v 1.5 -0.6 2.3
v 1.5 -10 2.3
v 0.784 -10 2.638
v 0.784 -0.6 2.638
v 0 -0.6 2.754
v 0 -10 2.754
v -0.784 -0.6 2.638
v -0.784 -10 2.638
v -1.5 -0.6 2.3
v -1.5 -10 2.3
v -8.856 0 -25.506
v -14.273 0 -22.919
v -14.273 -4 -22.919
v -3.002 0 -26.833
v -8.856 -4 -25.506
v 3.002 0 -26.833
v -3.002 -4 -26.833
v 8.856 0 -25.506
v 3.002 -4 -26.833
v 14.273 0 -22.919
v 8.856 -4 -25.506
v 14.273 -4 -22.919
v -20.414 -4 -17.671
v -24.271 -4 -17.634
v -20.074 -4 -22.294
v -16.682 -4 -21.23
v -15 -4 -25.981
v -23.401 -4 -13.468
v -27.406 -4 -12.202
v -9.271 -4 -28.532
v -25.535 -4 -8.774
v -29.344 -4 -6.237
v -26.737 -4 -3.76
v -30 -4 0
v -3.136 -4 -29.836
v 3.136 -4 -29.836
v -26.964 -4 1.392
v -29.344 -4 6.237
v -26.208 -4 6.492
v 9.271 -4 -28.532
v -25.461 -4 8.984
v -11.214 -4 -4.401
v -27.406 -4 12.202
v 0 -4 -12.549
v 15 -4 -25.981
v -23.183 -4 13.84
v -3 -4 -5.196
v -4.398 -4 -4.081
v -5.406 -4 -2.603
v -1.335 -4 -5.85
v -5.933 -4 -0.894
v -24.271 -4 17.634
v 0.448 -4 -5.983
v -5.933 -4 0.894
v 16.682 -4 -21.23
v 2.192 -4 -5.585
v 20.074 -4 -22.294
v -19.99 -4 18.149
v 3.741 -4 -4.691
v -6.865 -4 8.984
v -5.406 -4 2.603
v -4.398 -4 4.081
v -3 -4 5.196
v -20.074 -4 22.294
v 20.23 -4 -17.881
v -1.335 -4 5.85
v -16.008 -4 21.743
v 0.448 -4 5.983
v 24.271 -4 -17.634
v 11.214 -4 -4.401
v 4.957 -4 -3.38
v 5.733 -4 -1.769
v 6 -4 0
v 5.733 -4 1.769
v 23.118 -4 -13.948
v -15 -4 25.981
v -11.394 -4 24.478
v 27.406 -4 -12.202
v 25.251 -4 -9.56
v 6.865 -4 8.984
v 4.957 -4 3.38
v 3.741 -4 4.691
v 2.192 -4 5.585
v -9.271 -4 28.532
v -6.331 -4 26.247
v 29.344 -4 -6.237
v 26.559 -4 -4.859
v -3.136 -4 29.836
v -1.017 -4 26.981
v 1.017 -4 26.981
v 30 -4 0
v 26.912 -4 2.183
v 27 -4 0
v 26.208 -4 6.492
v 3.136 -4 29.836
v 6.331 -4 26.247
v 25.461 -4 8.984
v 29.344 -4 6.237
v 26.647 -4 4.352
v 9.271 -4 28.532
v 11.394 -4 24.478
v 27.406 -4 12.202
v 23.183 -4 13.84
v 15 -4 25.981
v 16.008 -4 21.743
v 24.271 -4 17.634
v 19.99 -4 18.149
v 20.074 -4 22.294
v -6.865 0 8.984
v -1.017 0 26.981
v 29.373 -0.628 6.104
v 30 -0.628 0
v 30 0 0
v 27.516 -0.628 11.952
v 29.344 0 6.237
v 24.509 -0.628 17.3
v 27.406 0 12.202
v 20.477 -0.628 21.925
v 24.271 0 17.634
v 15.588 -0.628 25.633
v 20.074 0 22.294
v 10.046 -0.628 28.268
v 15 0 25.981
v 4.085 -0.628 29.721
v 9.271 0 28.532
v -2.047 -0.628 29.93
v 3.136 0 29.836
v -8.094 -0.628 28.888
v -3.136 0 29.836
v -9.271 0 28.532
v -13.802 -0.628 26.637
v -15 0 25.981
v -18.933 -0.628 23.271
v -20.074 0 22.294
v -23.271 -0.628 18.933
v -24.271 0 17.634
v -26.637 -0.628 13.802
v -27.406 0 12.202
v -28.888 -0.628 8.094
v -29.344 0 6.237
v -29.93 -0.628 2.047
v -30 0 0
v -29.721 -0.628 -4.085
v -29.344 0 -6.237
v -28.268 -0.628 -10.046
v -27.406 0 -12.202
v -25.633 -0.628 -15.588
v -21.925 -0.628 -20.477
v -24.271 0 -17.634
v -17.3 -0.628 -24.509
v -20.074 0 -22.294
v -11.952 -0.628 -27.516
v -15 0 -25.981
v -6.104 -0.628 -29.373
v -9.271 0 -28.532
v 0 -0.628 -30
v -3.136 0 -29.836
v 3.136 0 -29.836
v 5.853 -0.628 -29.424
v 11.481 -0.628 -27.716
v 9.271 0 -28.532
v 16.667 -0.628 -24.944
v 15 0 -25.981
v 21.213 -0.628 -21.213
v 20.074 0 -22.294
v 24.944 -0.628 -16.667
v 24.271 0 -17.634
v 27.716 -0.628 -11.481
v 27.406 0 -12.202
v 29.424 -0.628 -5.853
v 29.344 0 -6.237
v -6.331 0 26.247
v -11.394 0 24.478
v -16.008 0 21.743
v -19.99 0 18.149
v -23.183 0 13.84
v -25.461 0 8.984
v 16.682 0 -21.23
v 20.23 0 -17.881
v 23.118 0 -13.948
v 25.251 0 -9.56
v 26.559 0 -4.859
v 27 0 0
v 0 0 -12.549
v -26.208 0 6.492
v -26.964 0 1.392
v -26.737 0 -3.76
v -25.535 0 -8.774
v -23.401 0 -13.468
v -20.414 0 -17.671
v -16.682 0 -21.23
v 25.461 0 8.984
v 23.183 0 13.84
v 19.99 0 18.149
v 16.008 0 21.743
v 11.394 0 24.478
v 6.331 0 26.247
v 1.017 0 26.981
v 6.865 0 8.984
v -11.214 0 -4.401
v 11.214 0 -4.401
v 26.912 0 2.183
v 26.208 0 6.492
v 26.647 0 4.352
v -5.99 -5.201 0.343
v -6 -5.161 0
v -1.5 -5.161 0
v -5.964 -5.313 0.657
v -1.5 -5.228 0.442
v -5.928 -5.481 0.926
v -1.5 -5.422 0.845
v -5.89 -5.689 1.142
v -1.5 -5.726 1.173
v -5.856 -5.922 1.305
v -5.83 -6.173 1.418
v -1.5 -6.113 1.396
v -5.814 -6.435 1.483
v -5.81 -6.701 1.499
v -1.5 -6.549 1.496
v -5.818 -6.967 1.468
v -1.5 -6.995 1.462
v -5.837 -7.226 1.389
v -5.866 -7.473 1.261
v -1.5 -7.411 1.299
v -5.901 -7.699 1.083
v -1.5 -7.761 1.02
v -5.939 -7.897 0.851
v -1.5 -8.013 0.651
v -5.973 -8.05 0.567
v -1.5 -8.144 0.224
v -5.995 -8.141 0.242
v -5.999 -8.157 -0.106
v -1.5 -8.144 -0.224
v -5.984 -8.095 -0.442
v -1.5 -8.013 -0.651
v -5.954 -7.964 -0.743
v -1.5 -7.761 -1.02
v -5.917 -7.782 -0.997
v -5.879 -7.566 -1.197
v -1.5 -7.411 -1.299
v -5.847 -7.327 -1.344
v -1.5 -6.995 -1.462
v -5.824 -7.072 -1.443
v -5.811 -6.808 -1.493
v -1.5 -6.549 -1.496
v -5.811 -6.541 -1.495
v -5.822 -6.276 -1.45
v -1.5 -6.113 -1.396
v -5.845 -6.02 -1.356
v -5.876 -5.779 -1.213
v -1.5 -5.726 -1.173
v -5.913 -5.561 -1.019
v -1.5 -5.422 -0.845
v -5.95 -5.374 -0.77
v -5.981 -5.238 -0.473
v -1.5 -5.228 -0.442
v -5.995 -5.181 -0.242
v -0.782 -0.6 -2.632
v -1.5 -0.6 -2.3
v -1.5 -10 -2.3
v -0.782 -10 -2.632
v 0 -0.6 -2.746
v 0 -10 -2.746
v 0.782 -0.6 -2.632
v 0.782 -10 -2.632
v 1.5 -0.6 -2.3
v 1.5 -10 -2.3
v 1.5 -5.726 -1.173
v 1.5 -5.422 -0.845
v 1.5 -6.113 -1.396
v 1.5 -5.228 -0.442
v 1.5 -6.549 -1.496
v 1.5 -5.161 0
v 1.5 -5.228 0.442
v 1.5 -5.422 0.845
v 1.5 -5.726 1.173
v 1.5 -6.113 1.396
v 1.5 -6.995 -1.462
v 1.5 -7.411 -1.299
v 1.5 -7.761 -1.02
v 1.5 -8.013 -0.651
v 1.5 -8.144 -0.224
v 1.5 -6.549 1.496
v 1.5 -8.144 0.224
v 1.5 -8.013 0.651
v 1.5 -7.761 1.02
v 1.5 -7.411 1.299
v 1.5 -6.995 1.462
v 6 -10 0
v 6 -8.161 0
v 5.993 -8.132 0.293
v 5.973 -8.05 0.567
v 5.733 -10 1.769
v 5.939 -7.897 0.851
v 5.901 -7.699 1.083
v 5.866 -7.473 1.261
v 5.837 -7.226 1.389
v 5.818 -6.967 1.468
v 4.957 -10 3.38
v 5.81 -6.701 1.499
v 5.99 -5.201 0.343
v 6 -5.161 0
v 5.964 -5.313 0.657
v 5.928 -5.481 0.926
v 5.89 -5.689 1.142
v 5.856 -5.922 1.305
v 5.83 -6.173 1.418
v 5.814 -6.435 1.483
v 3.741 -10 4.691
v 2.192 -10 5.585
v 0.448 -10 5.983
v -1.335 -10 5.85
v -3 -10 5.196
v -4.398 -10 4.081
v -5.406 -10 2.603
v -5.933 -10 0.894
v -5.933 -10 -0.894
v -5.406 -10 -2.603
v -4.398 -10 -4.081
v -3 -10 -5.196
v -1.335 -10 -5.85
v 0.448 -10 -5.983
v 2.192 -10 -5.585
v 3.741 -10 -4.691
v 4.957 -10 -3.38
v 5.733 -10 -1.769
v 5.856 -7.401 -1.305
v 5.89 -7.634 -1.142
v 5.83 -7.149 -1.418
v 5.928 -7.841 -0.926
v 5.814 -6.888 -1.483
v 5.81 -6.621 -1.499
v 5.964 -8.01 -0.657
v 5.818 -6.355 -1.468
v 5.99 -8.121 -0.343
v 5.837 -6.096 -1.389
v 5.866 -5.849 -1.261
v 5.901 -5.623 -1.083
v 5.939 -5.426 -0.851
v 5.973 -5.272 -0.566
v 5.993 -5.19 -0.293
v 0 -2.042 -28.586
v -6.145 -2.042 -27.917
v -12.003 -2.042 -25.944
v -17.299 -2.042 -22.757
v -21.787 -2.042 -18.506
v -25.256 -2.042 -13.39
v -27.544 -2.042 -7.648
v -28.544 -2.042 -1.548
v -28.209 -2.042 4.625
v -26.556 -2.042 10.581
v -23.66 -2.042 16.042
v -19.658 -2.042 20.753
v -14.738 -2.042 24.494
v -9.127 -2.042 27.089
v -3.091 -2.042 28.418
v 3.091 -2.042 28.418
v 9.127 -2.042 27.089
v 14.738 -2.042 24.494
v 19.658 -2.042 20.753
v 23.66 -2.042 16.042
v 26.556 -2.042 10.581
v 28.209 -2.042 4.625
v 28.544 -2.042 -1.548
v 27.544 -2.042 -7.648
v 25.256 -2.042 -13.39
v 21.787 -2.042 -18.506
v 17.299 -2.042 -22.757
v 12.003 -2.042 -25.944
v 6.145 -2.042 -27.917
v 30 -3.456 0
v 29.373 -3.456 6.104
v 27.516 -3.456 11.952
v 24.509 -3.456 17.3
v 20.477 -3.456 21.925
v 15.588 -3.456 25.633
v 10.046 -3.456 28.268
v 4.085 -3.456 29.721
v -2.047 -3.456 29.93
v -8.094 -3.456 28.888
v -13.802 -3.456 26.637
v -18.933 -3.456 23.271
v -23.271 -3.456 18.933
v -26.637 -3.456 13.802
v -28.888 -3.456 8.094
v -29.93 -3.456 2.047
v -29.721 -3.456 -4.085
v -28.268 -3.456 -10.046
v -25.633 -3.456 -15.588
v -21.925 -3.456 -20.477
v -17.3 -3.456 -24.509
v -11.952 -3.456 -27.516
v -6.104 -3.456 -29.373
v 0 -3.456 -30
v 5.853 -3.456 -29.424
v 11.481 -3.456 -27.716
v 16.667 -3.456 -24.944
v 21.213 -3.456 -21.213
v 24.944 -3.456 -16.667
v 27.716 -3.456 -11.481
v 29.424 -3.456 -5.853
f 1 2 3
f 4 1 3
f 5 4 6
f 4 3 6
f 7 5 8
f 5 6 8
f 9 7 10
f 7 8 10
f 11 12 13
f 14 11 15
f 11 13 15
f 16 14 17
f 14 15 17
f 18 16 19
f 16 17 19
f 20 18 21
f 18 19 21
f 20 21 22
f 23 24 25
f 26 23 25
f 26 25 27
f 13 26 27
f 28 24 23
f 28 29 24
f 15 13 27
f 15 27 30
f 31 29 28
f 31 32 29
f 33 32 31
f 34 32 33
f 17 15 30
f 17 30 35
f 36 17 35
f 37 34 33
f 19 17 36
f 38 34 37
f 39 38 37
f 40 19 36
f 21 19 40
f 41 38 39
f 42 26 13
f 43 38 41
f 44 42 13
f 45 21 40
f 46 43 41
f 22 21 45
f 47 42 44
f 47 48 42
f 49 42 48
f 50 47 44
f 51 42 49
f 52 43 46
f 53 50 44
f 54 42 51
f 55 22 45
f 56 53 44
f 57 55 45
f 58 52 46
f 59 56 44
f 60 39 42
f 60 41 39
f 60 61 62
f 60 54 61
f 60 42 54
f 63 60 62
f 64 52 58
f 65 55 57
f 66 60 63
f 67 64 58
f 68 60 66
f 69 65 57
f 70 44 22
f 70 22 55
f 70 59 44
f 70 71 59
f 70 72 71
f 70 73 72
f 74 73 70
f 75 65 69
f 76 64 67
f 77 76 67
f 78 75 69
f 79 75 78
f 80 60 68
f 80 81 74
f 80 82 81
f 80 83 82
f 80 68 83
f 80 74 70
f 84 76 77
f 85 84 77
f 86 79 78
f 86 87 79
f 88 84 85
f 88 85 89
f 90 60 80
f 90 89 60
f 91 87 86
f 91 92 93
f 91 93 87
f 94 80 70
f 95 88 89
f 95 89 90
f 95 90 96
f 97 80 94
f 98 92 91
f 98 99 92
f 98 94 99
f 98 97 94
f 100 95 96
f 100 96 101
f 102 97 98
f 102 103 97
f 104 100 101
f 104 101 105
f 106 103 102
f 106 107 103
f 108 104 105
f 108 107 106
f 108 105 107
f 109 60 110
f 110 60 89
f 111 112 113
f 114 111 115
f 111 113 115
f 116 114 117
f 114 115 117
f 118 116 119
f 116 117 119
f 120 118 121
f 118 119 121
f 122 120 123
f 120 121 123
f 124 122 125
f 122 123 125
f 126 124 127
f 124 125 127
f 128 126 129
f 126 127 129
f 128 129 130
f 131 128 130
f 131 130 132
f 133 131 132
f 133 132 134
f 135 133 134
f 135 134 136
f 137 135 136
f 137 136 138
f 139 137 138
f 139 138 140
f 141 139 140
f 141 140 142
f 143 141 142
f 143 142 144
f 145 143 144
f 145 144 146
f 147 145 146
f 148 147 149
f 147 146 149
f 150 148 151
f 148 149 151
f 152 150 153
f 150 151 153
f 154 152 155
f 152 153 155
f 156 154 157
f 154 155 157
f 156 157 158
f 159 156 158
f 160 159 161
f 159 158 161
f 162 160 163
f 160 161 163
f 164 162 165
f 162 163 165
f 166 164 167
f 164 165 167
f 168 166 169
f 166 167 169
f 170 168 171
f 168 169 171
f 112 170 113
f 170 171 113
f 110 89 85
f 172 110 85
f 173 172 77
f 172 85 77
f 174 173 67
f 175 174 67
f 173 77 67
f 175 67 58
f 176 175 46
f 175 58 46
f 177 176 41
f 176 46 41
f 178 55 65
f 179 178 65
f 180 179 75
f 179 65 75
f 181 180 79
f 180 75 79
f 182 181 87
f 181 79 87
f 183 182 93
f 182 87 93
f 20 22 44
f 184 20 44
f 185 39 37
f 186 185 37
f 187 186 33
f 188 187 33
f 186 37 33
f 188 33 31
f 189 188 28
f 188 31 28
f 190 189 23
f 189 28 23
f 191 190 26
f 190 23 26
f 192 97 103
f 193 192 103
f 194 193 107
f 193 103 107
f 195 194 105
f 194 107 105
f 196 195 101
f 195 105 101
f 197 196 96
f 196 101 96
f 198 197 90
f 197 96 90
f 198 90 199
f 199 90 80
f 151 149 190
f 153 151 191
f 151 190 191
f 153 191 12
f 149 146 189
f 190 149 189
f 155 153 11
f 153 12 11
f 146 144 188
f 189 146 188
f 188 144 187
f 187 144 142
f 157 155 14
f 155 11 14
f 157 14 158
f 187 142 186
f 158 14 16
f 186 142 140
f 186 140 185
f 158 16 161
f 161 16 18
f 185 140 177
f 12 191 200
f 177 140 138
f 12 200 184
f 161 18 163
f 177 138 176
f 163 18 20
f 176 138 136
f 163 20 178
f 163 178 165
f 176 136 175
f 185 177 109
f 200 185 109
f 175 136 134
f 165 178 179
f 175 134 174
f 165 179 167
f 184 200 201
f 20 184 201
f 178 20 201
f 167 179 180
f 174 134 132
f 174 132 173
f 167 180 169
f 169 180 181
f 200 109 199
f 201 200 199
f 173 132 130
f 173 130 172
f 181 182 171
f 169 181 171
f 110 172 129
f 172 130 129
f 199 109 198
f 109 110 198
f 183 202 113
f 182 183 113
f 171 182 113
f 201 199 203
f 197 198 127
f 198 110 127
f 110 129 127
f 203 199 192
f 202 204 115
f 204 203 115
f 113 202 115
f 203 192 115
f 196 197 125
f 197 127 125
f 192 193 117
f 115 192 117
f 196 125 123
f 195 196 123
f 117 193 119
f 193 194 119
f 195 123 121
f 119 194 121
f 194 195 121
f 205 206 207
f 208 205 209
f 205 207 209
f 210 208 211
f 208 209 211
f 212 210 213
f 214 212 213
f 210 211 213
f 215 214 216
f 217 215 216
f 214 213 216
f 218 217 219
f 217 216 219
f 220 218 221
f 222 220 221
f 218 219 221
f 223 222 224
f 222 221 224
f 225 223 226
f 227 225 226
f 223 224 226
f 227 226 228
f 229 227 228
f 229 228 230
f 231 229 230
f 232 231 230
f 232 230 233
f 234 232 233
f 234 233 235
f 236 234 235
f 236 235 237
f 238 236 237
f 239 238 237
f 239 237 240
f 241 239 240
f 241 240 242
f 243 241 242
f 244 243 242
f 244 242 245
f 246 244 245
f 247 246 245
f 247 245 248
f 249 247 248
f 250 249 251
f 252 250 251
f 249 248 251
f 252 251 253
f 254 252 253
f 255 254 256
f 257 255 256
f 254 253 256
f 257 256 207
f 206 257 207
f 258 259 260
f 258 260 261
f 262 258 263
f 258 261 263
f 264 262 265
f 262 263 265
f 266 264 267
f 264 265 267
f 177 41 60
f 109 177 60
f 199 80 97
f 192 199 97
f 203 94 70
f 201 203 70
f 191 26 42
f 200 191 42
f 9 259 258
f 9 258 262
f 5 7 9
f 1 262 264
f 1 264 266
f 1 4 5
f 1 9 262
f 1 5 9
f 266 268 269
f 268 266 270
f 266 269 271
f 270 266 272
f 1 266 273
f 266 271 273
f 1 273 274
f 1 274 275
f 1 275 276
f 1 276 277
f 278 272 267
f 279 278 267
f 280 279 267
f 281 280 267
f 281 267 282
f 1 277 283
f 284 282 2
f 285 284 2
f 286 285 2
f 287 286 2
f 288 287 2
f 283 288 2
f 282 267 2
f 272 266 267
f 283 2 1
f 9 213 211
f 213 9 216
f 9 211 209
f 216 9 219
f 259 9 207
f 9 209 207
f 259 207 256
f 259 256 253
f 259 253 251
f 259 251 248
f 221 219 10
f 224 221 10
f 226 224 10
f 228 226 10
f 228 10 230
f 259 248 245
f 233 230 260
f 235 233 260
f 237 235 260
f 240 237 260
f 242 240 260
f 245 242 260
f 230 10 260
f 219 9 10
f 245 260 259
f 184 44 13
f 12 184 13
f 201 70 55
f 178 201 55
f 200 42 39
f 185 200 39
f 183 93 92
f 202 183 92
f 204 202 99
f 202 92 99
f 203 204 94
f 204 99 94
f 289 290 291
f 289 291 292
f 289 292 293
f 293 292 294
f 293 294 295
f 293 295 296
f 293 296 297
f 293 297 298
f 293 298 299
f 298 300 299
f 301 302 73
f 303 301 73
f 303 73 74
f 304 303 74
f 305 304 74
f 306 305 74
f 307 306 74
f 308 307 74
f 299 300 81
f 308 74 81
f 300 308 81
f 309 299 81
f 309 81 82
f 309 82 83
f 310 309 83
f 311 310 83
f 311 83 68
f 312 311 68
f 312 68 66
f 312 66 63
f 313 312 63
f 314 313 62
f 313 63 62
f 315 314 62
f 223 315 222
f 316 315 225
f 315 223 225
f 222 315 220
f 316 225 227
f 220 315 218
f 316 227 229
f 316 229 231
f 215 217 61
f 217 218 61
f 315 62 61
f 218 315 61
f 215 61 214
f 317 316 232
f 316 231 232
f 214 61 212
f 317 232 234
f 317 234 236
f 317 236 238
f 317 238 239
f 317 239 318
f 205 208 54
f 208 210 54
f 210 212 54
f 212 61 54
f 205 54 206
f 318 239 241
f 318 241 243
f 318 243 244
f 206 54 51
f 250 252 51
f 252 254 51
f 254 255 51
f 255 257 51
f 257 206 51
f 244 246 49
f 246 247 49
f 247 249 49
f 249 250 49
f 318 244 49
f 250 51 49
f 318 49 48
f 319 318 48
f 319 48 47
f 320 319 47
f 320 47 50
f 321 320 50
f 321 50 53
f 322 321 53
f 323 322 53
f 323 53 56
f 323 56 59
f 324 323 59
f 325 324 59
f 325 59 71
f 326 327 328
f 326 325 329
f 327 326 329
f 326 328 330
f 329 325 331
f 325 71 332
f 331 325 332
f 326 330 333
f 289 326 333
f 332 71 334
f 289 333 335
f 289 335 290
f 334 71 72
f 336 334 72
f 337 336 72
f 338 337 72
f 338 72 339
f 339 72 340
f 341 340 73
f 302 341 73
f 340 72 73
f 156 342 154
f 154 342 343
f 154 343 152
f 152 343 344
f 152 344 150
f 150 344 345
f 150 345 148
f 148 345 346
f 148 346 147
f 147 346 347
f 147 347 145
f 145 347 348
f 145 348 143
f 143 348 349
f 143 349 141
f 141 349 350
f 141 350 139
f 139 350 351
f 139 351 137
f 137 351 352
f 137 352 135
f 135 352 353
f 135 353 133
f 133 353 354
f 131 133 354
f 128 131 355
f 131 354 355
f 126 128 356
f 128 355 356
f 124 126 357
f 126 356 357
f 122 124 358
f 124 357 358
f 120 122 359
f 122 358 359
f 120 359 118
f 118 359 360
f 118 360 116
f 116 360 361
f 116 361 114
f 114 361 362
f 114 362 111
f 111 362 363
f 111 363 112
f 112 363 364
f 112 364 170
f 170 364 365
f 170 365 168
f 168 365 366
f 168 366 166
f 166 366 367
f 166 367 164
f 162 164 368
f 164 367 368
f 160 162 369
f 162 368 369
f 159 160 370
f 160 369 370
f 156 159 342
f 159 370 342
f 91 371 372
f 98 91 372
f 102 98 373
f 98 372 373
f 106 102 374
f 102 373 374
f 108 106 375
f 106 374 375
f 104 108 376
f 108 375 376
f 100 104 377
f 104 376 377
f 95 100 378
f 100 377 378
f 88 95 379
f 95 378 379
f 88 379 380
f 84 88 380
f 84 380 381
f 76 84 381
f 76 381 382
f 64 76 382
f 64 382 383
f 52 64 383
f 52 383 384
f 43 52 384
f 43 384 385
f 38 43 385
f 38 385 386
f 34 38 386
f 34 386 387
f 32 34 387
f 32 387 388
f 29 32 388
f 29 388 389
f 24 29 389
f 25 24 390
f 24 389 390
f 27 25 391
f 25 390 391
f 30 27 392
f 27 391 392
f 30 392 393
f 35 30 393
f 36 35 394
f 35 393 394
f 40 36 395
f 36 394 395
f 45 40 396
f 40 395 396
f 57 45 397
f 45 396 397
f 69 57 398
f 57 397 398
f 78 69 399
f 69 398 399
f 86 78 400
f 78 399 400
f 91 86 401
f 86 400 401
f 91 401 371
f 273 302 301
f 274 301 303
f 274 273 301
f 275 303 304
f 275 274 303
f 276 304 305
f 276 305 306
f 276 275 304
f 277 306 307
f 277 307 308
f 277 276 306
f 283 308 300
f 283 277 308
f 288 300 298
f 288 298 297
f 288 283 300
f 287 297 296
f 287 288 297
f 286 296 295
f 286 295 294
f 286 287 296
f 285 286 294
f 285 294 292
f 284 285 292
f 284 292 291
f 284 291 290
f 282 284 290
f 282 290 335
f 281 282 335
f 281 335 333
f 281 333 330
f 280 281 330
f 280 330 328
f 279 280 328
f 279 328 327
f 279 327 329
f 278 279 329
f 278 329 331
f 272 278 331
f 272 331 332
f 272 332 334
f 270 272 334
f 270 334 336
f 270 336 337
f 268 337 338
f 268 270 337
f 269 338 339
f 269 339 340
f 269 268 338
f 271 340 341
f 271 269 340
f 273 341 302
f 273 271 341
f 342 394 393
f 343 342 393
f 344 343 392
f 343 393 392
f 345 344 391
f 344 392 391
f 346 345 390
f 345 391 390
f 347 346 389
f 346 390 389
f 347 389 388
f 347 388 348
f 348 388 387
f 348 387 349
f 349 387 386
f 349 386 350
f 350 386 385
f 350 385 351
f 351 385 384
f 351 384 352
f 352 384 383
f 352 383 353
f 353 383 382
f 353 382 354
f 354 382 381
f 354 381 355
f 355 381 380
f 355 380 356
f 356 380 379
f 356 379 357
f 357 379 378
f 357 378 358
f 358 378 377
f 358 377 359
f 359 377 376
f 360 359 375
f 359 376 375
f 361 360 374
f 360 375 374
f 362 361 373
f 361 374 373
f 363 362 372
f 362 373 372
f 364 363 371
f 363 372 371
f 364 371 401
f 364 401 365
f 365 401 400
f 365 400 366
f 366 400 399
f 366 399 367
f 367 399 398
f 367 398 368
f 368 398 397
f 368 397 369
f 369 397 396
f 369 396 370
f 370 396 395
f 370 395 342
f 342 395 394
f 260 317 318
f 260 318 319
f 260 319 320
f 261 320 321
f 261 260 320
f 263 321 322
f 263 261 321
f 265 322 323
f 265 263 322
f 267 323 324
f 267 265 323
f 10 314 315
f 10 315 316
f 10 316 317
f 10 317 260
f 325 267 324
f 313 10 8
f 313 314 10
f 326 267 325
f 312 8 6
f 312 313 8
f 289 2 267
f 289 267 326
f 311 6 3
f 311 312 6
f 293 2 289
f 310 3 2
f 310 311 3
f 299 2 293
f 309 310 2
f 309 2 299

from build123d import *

# Parameters (mm, degrees)
F0_R          = 6
F1_DEPTH      = 10
F0_R_2        = 30
F2_DEPTH      = 4
F3_R          = 1.5
F4_DEPTH      = 25.3
F4_DEPTH_BACK = 25
F6_DEPTH      = 9.4
F11_DEPTH     = 25


with BuildPart() as f1:
    # F0 (on Front) → F1 (new body)
    with BuildSketch(Plane.XZ):
        Circle(F0_R)
    extrude(amount=F1_DEPTH)

    # F0 (on Front) → F2 (join)
    with BuildSketch(Plane.XZ):
        Circle(F0_R_2)
        Circle(F0_R, mode=Mode.SUBTRACT)
    extrude(amount=F2_DEPTH)

    # F3 (on Right) → F4 (cut, two sides)
    with BuildSketch(Plane.YZ) as f4_sk:
        with Locations((-6.6611841321, 0)):
            Circle(F3_R)
    extrude(amount=-F4_DEPTH, mode=Mode.SUBTRACT)
    extrude(f4_sk.sketch, amount=F4_DEPTH_BACK, mode=Mode.SUBTRACT)

    # F5 (on face) → F6 (cut)
    with BuildSketch(Plane.XZ.offset(10)):
        with BuildLine():
            ThreePointArc((-1.5, -2.3), (0, -2.7459060435), (1.5, -2.3))
            Line((1.5, -2.3), (1.5, 2.3))
            ThreePointArc((1.5, 2.3), (0, 2.7540939565), (-1.5, 2.3))
            Line((-1.5, 2.3), (-1.5, -2.3))
        make_face()
    extrude(amount=-F6_DEPTH, mode=Mode.SUBTRACT)

    # F7 (on Right) → F8 (revolve, cut)
    with BuildSketch(Plane.YZ):
        Polygon((-3.4562557703, -30), (-0.6278286455, -30), (-2.0420422079, -28.5857864376), align=None)
    revolve(axis=Axis((0, -4.137200769, 0), (0, 1, 0)), mode=Mode.SUBTRACT)

    # F10 (on face) → F11 (cut)
    with BuildSketch(Plane.XZ.offset(4)):
        with BuildLine():
            Line((0, -12.5489194834), (-14.2731177399, -22.9189465287))
            ThreePointArc((-14.2731177399, -22.9189465287), (0, -27), (14.2731177399, -22.9189465287))
            Line((14.2731177399, -22.9189465287), (0, -12.5489194834))
        make_face()
        with BuildLine():
            ThreePointArc((-26.207849387, 6.4921976638), (-25.5345752261, -8.7741363121), (-16.6820319121, -21.2299272558))
            Line((-16.6820319121, -21.2299272558), (-11.2141093823, -4.4013921035))
            Line((-11.2141093823, -4.4013921035), (-26.207849387, 6.4921976638))
        make_face()
        with BuildLine():
            ThreePointArc((-1.0174091694, 26.9808242754), (-16.0079494962, 21.7427126396), (-25.4614935227, 8.9840050977))
            Line((-25.4614935227, 8.9840050977), (-6.8649301898, 8.9840050977))
            Line((-6.8649301898, 8.9840050977), (-1.0174091694, 26.9808242754))
        make_face()
        with BuildLine():
            ThreePointArc((25.4614935227, 8.9840050977), (16.0079494962, 21.7427126396), (1.0174091694, 26.9808242754))
            Line((1.0174091694, 26.9808242754), (6.8649301898, 8.9840050977))
            Line((6.8649301898, 8.9840050977), (25.4614935227, 8.9840050977))
        make_face()
        with BuildLine():
            Line((11.2141093823, -4.4013921035), (16.6820319121, -21.2299272558))
            ThreePointArc((16.6820319121, -21.2299272558), (24.2838924148, -11.8022272977), (27, 0))
            ThreePointArc((27, 0), (26.8012306942, 3.270173279), (26.207849387, 6.4921976638))
            Line((26.207849387, 6.4921976638), (11.2141093823, -4.4013921035))
        make_face()
    extrude(amount=-F11_DEPTH, mode=Mode.SUBTRACT)


solid = f1.part
